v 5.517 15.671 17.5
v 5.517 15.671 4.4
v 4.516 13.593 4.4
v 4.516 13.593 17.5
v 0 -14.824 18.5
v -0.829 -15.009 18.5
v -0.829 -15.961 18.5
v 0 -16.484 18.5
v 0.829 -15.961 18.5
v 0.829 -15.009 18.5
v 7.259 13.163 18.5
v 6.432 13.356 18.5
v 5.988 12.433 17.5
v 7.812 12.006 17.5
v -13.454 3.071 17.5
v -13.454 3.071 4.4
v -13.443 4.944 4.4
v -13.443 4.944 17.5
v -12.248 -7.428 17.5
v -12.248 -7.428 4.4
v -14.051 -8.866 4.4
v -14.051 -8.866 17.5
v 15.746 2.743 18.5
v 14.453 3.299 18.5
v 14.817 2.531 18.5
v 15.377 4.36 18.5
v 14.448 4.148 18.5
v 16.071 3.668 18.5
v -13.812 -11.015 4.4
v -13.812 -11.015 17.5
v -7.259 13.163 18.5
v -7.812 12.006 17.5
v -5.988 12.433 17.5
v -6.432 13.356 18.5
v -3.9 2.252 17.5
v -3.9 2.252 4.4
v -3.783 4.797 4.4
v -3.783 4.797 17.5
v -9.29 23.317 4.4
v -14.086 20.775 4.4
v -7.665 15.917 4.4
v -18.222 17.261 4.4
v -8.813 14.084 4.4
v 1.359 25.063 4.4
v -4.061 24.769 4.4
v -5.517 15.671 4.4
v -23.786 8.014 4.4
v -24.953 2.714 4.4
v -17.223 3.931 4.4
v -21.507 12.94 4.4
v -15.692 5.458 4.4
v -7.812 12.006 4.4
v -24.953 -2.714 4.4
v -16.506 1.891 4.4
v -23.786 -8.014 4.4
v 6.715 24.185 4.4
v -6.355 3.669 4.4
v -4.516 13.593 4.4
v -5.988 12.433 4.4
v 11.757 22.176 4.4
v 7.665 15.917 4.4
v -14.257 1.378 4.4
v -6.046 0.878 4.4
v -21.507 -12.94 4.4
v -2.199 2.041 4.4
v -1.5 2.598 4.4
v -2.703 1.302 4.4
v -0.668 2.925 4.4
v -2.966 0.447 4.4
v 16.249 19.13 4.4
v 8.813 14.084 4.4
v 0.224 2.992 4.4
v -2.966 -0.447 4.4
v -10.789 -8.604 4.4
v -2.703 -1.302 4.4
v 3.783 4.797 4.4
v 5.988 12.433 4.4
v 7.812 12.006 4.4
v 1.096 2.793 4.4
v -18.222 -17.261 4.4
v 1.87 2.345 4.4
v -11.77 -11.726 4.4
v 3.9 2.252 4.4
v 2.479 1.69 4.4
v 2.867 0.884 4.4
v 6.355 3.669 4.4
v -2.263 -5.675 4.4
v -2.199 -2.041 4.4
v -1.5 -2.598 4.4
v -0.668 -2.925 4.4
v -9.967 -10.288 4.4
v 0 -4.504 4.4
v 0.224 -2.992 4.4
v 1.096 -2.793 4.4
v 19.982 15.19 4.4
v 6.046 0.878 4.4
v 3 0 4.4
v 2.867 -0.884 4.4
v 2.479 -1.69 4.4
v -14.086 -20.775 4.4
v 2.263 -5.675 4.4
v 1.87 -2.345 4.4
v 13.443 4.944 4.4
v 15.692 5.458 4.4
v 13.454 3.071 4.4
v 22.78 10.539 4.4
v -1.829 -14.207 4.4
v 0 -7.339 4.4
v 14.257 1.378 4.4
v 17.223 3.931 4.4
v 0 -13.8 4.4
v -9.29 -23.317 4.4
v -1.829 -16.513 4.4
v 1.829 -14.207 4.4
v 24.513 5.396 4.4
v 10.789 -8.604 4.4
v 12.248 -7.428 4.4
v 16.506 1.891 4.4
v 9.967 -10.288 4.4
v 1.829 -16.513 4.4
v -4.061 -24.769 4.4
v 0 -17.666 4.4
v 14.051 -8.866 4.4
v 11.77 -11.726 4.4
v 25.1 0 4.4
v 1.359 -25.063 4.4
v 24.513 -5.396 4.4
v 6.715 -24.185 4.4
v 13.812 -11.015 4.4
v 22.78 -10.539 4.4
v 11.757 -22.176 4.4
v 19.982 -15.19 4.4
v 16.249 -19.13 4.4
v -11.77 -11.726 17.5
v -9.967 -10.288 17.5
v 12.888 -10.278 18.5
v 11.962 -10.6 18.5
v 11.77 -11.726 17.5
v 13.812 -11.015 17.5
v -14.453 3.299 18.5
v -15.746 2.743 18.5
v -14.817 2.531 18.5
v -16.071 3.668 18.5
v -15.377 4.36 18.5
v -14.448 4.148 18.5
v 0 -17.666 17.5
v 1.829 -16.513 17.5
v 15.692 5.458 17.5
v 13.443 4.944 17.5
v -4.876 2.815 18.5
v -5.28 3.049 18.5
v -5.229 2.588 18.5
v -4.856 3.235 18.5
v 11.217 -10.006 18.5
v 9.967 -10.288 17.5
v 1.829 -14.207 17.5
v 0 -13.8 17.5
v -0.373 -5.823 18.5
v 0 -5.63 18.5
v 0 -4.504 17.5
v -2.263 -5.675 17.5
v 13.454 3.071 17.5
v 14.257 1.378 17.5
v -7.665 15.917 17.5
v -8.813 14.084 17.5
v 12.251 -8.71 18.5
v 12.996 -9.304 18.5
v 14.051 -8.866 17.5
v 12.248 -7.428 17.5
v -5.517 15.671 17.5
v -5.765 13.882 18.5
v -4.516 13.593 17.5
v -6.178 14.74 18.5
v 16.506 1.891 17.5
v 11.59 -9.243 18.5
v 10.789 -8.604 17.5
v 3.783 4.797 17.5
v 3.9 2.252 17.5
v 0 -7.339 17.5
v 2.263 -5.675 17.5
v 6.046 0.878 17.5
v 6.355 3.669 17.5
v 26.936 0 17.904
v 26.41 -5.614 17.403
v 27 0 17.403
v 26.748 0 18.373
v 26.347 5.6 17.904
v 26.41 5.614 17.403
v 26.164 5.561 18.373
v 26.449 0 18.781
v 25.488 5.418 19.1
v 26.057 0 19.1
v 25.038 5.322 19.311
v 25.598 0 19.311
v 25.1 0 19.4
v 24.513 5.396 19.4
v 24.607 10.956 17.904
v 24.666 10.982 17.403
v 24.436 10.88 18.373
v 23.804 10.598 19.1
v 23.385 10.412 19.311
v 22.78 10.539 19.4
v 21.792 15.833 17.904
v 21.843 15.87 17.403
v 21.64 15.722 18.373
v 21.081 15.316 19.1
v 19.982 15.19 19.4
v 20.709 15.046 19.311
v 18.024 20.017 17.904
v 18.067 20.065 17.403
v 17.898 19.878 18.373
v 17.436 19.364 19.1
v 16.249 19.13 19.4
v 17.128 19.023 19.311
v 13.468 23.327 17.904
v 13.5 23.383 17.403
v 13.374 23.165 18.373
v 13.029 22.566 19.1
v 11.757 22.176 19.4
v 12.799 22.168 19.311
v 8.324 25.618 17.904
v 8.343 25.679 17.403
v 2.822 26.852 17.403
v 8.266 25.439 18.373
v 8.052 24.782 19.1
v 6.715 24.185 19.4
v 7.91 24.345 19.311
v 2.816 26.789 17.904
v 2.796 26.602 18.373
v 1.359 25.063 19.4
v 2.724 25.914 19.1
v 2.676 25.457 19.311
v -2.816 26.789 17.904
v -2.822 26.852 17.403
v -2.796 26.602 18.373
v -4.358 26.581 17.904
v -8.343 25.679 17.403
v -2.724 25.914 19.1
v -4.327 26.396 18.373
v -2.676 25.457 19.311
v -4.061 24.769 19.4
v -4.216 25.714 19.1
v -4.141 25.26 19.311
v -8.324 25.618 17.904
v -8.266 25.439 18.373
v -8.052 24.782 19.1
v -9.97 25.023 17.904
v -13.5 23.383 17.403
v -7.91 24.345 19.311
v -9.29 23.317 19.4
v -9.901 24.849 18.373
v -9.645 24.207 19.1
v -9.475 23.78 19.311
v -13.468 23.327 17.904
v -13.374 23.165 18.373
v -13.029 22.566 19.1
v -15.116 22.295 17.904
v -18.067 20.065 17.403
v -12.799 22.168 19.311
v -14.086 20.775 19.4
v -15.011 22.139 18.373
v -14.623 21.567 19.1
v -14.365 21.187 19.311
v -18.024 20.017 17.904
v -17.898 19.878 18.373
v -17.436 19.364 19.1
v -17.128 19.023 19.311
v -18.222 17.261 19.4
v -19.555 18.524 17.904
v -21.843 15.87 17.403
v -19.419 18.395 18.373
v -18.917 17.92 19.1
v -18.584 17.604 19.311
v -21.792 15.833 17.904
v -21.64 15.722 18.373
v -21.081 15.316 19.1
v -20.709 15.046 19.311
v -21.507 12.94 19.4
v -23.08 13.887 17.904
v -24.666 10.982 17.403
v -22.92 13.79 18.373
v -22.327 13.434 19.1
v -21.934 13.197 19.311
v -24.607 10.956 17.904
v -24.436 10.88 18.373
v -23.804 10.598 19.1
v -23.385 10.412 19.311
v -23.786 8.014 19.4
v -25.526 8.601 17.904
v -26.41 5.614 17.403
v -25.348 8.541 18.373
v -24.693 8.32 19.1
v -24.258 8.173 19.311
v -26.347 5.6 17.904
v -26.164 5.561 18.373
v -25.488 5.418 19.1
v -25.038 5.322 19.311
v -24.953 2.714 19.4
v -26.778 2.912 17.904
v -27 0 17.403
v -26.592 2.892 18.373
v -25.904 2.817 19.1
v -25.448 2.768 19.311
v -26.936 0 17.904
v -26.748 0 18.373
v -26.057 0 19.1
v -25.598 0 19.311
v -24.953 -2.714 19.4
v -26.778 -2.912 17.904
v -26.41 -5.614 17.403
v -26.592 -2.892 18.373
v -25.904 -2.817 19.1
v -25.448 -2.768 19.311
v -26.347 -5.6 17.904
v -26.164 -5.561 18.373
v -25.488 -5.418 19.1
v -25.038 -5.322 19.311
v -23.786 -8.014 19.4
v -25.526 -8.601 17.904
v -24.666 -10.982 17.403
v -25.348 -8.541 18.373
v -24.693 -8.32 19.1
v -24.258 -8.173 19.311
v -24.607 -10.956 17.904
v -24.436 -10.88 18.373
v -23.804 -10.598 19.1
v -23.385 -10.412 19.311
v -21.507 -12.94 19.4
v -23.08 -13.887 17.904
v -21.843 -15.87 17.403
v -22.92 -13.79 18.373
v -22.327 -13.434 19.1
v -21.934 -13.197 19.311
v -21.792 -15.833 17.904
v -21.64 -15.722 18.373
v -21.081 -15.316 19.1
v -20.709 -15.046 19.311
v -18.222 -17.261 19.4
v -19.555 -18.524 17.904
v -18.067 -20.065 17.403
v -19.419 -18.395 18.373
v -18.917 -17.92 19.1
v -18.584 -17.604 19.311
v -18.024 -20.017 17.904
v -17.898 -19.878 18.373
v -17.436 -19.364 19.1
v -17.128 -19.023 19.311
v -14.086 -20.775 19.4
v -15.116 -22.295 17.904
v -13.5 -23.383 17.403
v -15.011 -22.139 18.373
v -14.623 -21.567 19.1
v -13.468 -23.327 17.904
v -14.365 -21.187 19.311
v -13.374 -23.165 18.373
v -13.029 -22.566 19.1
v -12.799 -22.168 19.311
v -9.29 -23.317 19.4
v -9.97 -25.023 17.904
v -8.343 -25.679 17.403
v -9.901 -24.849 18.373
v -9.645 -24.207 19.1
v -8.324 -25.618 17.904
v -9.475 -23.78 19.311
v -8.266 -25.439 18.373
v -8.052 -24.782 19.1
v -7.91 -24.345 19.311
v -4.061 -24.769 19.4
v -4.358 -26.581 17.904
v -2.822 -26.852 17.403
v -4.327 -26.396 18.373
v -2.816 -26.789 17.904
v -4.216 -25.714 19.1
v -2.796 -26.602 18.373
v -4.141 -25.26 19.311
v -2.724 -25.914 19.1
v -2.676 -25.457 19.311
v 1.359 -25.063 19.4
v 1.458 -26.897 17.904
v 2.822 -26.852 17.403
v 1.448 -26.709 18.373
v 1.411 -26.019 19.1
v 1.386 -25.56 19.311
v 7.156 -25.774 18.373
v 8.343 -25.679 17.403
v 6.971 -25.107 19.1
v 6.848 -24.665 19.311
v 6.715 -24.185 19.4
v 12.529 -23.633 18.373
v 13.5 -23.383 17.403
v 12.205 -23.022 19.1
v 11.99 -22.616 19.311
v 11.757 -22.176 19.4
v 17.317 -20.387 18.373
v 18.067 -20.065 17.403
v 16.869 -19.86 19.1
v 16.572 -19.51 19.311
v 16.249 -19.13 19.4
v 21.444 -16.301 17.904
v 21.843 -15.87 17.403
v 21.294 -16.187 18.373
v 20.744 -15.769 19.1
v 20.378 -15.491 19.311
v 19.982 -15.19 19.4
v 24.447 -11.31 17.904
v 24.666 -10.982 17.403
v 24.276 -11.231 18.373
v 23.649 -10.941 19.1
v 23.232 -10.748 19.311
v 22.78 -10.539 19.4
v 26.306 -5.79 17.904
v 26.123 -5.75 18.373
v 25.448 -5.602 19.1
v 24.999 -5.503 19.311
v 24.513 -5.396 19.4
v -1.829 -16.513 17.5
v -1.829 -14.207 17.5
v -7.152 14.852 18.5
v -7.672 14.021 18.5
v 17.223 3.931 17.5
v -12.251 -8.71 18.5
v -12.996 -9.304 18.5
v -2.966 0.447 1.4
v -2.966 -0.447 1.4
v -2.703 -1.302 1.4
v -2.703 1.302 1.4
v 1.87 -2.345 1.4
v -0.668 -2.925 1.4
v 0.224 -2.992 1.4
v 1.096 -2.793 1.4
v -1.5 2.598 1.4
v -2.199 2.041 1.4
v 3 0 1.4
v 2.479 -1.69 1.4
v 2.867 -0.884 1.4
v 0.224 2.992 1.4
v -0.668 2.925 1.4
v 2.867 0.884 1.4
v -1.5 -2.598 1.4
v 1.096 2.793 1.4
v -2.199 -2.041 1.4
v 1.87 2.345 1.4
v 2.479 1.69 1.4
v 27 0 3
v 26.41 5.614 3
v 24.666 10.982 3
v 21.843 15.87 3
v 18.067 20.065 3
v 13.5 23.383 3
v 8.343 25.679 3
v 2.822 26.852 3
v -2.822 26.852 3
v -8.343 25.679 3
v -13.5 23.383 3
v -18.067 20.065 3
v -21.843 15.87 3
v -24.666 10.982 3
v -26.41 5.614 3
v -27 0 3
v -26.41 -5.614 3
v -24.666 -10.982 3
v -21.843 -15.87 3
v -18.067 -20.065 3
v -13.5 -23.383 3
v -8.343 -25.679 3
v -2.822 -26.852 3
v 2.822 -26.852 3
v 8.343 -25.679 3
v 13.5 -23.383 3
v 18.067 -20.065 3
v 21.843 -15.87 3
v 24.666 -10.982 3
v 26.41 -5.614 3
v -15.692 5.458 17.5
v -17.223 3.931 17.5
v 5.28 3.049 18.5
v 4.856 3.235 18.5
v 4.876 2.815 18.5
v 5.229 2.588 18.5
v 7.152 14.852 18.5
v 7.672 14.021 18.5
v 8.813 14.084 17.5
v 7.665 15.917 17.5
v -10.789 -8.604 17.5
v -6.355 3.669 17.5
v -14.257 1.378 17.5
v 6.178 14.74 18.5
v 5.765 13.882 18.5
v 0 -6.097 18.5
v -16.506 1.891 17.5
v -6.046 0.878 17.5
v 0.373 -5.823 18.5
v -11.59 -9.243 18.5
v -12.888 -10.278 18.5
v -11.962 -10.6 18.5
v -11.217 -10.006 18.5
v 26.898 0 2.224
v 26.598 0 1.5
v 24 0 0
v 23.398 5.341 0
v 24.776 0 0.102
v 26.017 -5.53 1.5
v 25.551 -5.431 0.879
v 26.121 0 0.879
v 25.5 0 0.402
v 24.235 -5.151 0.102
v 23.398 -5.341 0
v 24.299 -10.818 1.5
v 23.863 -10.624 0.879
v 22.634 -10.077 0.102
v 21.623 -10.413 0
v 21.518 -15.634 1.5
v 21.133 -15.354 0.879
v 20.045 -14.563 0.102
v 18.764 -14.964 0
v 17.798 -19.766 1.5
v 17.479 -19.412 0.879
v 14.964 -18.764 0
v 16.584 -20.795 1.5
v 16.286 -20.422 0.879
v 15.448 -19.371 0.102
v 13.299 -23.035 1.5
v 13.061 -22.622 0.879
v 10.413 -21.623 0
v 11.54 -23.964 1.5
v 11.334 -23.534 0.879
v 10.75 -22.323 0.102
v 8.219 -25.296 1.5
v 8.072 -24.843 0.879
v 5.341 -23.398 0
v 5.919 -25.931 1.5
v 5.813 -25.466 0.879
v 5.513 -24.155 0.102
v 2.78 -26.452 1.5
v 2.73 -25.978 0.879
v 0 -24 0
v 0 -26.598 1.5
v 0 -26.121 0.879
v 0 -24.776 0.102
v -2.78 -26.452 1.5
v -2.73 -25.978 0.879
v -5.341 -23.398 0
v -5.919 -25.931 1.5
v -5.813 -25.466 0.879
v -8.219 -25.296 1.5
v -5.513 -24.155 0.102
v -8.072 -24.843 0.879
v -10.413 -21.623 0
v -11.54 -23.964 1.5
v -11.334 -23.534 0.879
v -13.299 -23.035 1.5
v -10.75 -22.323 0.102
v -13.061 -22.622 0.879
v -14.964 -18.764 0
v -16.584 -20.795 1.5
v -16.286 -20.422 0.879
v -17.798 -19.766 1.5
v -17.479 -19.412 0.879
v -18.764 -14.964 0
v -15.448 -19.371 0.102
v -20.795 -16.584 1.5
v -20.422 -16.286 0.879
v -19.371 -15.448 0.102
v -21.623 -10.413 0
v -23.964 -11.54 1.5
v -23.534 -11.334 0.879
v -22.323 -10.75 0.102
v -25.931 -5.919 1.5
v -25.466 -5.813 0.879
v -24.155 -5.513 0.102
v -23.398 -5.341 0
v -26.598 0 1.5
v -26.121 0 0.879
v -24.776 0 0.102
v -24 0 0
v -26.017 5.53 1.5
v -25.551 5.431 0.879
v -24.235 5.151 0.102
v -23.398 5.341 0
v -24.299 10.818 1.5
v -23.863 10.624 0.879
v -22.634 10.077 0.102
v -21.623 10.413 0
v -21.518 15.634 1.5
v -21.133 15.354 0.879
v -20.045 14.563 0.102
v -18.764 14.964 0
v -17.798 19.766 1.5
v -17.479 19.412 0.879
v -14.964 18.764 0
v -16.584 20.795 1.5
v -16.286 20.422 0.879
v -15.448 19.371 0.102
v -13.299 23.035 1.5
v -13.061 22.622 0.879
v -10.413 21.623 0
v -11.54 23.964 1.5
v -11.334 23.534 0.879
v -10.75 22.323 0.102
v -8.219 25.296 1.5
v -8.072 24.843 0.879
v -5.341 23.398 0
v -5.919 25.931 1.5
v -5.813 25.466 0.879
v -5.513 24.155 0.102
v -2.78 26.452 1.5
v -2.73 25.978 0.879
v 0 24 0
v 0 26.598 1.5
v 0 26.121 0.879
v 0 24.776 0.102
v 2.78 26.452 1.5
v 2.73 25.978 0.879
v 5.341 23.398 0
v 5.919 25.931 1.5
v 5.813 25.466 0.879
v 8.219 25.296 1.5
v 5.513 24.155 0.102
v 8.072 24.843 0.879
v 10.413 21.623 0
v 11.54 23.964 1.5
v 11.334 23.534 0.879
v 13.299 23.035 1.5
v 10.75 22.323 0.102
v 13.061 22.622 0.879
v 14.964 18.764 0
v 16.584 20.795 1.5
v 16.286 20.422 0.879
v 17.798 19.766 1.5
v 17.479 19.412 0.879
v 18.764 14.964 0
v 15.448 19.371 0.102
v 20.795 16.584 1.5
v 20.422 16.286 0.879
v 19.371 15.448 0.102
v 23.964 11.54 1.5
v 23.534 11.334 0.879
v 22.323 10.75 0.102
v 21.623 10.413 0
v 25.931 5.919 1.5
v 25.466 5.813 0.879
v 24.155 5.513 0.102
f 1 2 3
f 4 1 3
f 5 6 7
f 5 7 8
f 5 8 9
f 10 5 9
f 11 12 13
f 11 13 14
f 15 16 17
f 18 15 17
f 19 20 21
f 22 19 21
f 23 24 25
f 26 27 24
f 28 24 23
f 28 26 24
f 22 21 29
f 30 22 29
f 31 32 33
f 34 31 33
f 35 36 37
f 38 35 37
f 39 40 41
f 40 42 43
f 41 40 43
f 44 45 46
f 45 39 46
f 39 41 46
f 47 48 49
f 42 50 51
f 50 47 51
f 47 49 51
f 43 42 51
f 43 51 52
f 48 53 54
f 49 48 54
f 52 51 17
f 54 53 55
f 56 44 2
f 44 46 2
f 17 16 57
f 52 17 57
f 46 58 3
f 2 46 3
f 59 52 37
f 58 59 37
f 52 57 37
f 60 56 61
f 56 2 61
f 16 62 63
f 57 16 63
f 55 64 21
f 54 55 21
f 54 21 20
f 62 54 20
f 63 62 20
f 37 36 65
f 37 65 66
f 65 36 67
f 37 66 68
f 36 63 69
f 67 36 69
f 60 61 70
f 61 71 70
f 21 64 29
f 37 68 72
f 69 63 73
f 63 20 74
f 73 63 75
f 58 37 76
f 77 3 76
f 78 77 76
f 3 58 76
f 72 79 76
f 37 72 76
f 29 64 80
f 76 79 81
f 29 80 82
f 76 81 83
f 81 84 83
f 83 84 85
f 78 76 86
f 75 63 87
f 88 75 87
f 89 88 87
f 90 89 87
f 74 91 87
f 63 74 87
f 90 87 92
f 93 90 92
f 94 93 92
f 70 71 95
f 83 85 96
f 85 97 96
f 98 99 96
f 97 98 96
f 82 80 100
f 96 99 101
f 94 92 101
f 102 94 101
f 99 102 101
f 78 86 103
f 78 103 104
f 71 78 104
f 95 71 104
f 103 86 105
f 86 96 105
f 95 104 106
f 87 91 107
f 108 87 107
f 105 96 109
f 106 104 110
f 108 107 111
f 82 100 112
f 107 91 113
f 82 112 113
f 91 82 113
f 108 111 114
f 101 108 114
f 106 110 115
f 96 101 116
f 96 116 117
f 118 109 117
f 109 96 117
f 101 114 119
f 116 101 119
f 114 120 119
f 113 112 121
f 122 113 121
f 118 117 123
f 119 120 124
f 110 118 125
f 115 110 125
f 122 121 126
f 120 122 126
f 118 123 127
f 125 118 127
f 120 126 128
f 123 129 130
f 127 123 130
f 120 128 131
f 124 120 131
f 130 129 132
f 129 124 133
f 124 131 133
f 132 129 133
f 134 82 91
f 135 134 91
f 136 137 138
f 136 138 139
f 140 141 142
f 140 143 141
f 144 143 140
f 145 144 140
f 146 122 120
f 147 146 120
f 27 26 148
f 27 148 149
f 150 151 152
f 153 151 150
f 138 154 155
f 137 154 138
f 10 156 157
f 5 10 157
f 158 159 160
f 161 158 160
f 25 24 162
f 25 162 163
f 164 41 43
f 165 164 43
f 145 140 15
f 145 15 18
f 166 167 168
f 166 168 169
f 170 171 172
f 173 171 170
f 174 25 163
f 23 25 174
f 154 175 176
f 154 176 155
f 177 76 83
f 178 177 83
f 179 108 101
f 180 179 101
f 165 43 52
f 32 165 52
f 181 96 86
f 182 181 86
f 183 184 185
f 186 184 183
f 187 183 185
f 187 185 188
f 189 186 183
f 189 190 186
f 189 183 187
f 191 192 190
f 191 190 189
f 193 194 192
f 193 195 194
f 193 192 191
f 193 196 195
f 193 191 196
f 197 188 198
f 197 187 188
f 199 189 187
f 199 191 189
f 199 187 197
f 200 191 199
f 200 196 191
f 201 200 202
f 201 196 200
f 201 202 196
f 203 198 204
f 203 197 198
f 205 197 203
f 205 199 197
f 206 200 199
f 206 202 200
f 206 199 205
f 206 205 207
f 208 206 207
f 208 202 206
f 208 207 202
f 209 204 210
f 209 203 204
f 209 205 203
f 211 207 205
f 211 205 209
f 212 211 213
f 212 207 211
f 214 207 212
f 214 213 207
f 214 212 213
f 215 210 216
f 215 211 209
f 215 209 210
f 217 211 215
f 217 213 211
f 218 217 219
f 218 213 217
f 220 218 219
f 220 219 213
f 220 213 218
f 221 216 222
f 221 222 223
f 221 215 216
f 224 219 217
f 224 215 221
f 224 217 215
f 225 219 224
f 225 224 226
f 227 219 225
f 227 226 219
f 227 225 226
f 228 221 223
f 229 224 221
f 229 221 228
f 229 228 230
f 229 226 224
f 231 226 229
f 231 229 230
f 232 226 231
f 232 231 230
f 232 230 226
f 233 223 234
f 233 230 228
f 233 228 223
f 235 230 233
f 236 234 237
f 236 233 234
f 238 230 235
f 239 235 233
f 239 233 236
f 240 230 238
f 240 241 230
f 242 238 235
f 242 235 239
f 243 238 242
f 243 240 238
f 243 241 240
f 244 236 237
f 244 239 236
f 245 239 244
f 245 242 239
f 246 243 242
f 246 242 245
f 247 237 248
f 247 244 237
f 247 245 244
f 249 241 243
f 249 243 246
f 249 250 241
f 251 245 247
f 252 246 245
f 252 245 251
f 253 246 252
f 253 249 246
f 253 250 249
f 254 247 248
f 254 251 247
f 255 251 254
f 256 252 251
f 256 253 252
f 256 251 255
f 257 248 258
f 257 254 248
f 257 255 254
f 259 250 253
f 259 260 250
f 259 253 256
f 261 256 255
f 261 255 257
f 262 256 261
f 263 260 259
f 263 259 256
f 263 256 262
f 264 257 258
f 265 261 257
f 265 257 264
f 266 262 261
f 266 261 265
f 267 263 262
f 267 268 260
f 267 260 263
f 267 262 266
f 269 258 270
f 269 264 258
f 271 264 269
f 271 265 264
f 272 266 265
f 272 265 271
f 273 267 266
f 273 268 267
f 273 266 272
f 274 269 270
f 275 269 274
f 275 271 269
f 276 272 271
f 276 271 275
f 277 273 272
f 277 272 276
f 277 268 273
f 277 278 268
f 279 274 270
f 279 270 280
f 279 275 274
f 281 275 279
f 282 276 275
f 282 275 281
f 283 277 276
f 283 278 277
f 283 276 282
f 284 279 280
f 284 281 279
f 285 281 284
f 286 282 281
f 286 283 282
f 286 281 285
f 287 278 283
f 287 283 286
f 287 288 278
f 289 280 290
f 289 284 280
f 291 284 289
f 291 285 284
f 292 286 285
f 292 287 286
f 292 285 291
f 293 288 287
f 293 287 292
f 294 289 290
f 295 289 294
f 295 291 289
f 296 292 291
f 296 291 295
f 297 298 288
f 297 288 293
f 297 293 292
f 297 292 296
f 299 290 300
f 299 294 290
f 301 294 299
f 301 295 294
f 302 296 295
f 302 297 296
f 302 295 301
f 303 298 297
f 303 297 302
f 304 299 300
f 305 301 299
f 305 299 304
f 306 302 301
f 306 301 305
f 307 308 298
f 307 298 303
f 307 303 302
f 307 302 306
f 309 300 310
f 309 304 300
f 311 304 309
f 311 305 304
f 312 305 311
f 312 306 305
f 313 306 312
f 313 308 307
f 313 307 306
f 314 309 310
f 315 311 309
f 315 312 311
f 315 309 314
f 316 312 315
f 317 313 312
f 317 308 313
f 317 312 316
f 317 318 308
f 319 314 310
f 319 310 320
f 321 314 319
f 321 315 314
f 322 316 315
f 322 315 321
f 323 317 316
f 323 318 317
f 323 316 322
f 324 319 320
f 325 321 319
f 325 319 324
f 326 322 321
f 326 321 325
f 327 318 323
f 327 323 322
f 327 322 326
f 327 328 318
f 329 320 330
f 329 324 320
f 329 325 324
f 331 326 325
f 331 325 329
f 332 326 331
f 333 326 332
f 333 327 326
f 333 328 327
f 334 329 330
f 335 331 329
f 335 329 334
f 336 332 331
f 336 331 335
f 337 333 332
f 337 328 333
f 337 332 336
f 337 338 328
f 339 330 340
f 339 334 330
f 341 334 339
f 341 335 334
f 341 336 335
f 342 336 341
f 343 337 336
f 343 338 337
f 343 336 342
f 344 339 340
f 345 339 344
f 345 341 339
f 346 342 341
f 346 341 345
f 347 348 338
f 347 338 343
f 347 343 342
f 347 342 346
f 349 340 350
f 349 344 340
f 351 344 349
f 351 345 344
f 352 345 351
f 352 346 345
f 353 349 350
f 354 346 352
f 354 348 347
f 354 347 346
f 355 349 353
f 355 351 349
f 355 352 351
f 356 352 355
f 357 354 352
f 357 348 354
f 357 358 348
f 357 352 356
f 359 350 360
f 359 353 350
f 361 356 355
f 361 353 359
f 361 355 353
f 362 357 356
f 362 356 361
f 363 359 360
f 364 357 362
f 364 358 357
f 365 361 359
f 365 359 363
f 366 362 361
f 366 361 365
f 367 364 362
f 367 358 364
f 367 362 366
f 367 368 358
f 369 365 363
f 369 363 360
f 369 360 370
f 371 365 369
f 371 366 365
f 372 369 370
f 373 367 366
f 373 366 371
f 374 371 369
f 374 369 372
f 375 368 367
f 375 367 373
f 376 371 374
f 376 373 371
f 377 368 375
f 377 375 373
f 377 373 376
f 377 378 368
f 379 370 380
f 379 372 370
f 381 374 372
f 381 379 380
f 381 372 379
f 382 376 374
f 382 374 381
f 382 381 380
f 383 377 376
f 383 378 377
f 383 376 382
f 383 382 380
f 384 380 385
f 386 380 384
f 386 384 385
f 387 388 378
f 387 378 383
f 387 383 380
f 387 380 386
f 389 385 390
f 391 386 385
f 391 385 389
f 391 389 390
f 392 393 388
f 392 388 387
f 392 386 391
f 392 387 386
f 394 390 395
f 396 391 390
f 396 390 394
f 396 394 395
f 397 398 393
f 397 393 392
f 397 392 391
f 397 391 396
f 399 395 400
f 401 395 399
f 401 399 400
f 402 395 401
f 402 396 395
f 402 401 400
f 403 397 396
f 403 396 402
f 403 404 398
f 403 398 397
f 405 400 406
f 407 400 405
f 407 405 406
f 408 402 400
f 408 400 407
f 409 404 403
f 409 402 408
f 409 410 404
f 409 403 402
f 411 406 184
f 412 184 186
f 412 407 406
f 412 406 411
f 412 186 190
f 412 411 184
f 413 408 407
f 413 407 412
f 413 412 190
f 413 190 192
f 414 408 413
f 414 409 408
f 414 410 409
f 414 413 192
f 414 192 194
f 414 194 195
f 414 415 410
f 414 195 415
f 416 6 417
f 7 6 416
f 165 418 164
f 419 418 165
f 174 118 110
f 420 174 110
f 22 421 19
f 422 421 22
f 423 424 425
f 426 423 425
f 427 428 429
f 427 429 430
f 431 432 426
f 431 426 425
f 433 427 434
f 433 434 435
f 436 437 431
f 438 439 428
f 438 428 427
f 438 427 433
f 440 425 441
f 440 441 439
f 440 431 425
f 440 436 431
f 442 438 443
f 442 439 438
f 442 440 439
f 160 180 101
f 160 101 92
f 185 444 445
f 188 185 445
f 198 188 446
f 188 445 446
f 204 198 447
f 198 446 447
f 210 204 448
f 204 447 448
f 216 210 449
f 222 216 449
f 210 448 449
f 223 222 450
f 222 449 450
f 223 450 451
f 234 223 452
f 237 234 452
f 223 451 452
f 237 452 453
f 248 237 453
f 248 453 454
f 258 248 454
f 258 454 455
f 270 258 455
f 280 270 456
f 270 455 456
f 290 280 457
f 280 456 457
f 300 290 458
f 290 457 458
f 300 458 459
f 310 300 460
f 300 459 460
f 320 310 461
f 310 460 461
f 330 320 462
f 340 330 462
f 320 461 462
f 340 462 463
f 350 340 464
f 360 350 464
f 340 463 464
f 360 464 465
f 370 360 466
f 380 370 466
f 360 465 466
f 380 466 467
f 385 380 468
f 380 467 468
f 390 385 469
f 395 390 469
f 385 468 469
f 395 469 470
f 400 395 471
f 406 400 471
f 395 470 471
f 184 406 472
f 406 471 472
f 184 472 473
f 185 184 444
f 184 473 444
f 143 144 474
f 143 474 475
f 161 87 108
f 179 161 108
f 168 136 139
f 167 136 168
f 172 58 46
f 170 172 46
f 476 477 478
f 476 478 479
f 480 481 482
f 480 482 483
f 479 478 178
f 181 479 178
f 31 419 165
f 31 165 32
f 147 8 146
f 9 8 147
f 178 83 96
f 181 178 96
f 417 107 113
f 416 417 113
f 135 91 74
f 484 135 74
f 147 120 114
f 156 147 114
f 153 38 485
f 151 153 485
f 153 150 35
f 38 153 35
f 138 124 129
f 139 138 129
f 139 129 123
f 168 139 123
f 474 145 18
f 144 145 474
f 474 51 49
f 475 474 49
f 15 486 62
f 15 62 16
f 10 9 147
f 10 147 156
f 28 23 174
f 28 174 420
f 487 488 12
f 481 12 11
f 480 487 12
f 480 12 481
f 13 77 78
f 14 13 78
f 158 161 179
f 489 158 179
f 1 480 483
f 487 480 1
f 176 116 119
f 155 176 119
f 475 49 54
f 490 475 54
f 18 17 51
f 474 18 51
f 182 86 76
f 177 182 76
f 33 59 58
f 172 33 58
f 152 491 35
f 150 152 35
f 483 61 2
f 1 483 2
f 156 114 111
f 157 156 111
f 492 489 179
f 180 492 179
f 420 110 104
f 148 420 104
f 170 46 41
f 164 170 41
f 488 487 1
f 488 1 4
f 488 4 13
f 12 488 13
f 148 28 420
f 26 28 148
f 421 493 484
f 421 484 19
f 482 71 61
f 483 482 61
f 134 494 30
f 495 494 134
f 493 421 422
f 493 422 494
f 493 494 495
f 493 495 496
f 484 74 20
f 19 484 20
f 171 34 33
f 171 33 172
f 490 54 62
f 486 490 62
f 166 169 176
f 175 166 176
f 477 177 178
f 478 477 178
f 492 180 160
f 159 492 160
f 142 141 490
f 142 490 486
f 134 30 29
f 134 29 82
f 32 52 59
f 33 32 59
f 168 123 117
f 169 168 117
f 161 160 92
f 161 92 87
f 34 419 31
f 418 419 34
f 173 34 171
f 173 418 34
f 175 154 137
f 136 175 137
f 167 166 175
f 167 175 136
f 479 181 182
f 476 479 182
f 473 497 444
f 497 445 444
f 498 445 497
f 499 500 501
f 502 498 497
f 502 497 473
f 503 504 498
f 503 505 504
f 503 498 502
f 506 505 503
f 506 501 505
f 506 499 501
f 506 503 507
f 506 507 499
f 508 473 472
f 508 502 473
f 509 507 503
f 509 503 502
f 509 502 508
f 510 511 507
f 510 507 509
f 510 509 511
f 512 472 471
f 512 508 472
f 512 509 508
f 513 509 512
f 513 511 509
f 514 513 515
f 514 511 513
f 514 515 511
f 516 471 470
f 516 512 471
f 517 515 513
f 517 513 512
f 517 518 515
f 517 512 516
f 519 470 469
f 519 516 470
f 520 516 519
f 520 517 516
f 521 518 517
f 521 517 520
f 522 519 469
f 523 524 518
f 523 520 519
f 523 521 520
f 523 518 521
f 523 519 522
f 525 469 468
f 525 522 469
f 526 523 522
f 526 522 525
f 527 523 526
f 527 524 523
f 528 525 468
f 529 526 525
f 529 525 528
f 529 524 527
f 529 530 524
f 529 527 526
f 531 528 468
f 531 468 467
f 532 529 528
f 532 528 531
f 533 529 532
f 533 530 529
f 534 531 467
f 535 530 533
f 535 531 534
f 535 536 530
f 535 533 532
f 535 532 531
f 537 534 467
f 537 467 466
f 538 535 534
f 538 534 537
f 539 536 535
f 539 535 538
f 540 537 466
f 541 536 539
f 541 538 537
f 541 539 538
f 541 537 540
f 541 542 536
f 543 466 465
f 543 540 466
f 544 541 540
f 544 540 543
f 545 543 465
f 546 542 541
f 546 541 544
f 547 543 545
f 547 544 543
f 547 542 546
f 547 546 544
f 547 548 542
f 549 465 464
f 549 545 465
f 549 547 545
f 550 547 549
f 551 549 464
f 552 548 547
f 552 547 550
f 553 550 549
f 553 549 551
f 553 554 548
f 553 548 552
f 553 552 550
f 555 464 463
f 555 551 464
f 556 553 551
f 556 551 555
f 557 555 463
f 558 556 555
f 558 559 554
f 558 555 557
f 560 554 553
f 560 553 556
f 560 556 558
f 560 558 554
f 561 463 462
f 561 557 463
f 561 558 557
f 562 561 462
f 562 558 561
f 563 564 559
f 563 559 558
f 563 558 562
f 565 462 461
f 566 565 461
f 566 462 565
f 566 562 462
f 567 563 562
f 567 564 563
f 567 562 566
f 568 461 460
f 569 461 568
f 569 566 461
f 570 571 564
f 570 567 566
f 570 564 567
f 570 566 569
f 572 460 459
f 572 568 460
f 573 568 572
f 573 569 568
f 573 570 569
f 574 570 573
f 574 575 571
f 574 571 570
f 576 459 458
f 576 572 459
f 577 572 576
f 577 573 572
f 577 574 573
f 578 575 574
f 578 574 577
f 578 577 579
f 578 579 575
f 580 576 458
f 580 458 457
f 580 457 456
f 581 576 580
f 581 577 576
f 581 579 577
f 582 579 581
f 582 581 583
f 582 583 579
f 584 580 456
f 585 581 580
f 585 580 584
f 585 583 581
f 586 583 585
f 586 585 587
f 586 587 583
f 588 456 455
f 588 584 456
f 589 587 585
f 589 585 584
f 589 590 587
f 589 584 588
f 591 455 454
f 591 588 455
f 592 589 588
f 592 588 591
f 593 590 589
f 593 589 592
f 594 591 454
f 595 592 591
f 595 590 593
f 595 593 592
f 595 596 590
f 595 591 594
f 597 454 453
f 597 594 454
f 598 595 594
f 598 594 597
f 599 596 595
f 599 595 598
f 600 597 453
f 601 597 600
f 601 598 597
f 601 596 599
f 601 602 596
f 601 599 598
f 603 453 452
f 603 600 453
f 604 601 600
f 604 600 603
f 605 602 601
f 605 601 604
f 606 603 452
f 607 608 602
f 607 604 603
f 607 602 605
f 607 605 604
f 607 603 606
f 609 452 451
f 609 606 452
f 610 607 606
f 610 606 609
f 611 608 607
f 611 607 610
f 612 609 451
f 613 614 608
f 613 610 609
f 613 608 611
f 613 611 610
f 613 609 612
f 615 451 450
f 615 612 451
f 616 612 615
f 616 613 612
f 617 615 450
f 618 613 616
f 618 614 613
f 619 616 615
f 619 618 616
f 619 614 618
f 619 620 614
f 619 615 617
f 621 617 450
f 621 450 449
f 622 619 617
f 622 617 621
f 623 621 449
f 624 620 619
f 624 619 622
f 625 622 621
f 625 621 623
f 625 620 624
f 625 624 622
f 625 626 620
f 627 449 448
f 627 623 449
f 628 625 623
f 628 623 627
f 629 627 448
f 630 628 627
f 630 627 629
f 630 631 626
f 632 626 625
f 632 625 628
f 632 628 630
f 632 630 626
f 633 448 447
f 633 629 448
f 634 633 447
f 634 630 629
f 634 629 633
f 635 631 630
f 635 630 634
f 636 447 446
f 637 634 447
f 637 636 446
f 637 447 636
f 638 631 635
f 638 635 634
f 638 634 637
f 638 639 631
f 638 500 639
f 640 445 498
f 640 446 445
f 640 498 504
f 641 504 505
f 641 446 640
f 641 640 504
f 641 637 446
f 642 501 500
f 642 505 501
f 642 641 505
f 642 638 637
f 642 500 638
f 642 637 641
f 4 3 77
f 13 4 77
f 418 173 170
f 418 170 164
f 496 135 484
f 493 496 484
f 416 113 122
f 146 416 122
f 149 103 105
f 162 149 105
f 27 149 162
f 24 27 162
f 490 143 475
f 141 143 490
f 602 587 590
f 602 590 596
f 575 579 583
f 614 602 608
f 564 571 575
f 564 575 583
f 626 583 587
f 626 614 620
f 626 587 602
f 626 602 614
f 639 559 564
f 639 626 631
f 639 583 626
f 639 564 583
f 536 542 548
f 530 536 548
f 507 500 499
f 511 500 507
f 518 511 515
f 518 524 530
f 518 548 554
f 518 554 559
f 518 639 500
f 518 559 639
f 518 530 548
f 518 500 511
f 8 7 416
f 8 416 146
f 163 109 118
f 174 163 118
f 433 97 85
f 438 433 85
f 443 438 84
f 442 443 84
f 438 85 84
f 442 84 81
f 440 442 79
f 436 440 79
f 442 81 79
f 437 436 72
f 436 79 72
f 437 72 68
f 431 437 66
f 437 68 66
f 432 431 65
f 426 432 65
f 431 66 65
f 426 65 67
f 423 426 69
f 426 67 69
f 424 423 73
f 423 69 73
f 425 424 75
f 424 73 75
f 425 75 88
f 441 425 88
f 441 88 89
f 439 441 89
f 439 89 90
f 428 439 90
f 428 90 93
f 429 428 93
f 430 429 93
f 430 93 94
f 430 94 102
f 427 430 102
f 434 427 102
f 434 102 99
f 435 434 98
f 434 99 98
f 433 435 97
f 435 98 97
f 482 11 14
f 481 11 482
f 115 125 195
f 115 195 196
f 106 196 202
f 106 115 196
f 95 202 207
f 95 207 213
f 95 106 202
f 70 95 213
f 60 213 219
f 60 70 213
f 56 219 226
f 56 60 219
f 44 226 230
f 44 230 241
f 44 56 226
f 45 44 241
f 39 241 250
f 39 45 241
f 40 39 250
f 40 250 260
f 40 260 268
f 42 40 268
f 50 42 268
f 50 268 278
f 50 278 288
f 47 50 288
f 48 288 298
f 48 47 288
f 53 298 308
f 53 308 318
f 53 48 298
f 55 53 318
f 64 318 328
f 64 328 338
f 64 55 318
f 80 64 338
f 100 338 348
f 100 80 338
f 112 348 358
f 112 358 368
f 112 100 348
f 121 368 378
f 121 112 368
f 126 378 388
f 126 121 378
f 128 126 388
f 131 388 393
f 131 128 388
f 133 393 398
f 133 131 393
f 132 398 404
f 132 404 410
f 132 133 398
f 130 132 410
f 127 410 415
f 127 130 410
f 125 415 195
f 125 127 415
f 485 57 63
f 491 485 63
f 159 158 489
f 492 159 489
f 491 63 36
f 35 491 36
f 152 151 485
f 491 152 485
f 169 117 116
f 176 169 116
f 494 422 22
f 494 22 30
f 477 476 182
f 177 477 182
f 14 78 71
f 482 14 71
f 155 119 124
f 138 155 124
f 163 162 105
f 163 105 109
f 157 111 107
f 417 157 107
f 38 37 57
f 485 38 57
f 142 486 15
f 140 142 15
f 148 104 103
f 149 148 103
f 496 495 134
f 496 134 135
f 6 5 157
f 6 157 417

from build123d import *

# Parameters (mm, degrees)
F0_R      = 25
F1_DEPTH  = 4
F3_R      = 27
F4_DEPTH  = 4.4
F5_DEPTH  = 14.5
F6_R      = 27
F6_R_2    = 25.1
F7_DEPTH  = 15
F9_R      = 3
F10_SIZE  = 1
F11_R     = 3
F12_DEPTH = 3


# Not quite as in the source:
# - a fillet or chamfer that OpenCascade refuses, or shapes differently, is made with other operations: its cross-section is extruded or revolved along the edge and cut away or added
# - a feature names something its author has since deleted; it is built from what else it names


with BuildPart() as f1:
    # F0 (on Top) → F1 (new body)
    with BuildSketch(Plane.XY):
        Circle(F0_R)
    extrude(amount=F1_DEPTH)

    # F3 (on face) → F4 (join)
    with BuildSketch(Plane(origin=(0, 0, 0), x_dir=(1, 0, 0), z_dir=(0, 0, -1))):
        Circle(F3_R)
    extrude(amount=-F4_DEPTH)

    # F2 (on face) → F5 (join)
    with BuildSketch(Plane.XY.offset(4)):
        Polygon((1.8290777225, -14.20661062), (0, -13.8), (-1.8290777225, -14.20661062), (-1.8290777225, -16.5130756795), (0, -17.6663082093), (1.8290777225, -16.5130756795), align=None)
        Polygon((10.7892744581, -8.6041592657), (9.9667641351, -10.2877073879), (11.7700311319, -11.7257648309), (13.812075937, -11.014763005), (14.0508537454, -8.8657037362), (12.2475867487, -7.4276462932), align=None)
        Polygon((13.4540051881, 3.0707888886), (14.257429314, 1.3780493383), (16.506066479, 1.8912860975), (17.2233769785, 3.9311234023), (15.6920503129, 5.4577239479), (13.4434131479, 4.9444871887), align=None)
        Polygon((5.9875955998, 12.4333703771), (7.811959421, 12.0061068057), (8.8126971051, 14.0841600192), (7.6651238623, 15.9167937073), (5.5168129352, 15.671374182), (4.5160752511, 13.5933209684), align=None)
        Polygon((-5.9875955998, 12.4333703771), (-4.5160752511, 13.5933209684), (-5.5168129352, 15.671374182), (-7.6651238623, 15.9167937073), (-8.8126971051, 14.0841600192), (-7.811959421, 12.0061068057), align=None)
        Polygon((-13.4540051881, 3.0707888886), (-13.4434131479, 4.9444871887), (-15.6920503129, 5.4577239479), (-17.2233769785, 3.9311234023), (-16.506066479, 1.8912860975), (-14.257429314, 1.3780493383), align=None)
        Polygon((-10.7892744581, -8.6041592657), (-12.2475867487, -7.4276462932), (-14.0508537454, -8.8657037362), (-13.812075937, -11.014763005), (-11.7700311319, -11.7257648309), (-9.9667641351, -10.2877073879), align=None)
        Polygon((2.2625249746, -5.6745974369), (0, -4.5038154349), (-2.2625249746, -5.6745974369), (0, -7.3385047726), align=None)
        Polygon((3.7830830493, 4.7967028232), (3.9004185806, 2.2519077174), (6.0456080239, 0.8778946137), (6.3553315589, 3.6692523863), align=None)
        Polygon((-6.0456080239, 0.8778946137), (-3.9004185806, 2.2519077174), (-3.7830830493, 4.7967028232), (-6.3553315589, 3.6692523863), align=None)
    extrude(amount=F5_DEPTH)

    # F6 (on face) → F7 (join)
    with BuildSketch(Plane.XY.offset(4.4)):
        Circle(F6_R)
        Circle(F6_R_2, mode=Mode.SUBTRACT)
    extrude(amount=F7_DEPTH)

    # F8: fillet of radius 2 on 1 edges, made by hand

    # F8_s1 → F8_t2 (revolve, cut)
    with BuildSketch(Plane.XZ):
        with BuildLine():
            ThreePointArc((27, 17.4025015645), (26.4491376746, 18.7809064397), (25.1, 19.4))
            Line((25.1, 19.4), (27, 19.4))
            Line((27, 19.4), (27, 17.4025015645))
        make_face()
    revolve(axis=Axis((0, 0, 19.4), (0, 0, 1)), mode=Mode.SUBTRACT)

    # F9
    f9_edges = [f1.edges().sort_by_distance(p)[0] for p in [
        (-27, 0, 0),
    ]]
    fillet(f9_edges, radius=F9_R)

    # F10
    f10_edges = [f1.edges().sort_by_distance(p)[0] for p in [
        (1.131262, -5.089206, 18.5),
        (-1.131262, -5.089206, 18.5),
        (-1.131262, -6.506551, 18.5),
        (1.131262, -6.506551, 18.5),
        (6.20047, 2.273574, 18.5),
        (5.069207, 4.232978, 18.5),
        (3.841751, 3.524305, 18.5),
        (4.973013, 1.564901, 18.5),
        (5.016444, 14.632348, 18.5),
        (5.251835, 13.013346, 18.5),
        (6.899778, 12.219739, 18.5),
        (8.312328, 13.045133, 18.5),
        (8.23891, 15.000477, 18.5),
        (6.590968, 15.794084, 18.5),
        (-5.069207, 4.232978, 18.5),
        (-6.20047, 2.273574, 18.5),
        (-4.973013, 1.564901, 18.5),
        (-3.841751, 3.524305, 18.5),
        (-5.251835, 13.013346, 18.5),
        (-5.016444, 14.632348, 18.5),
        (-6.590968, 15.794084, 18.5),
        (-8.23891, 15.000477, 18.5),
        (-8.312328, 13.045133, 18.5),
        (-6.899778, 12.219739, 18.5),
        (13.855717, 2.224419, 18.5),
        (15.381748, 1.634668, 18.5),
        (16.864722, 2.911205, 18.5),
        (16.457714, 4.694424, 18.5),
        (14.567732, 5.201106, 18.5),
        (13.448709, 4.007638, 18.5),
        (10.378019, -9.445933, 18.5),
        (10.868398, -11.006736, 18.5),
        (12.791054, -11.370264, 18.5),
        (13.931465, -9.940233, 18.5),
        (13.14922, -8.146675, 18.5),
        (11.518431, -8.015903, 18.5),
        (0.914539, -14.003305, 18.5),
        (-0.914539, -14.003305, 18.5),
        (-1.829078, -15.359843, 18.5),
        (-0.914539, -17.089692, 18.5),
        (0.914539, -17.089692, 18.5),
        (1.829078, -15.359843, 18.5),
        (-11.518431, -8.015903, 18.5),
        (-13.14922, -8.146675, 18.5),
        (-13.931465, -9.940233, 18.5),
        (-12.791054, -11.370264, 18.5),
        (-10.868398, -11.006736, 18.5),
        (-10.378019, -9.445933, 18.5),
        (-15.381748, 1.634668, 18.5),
        (-13.855717, 2.224419, 18.5),
        (-13.448709, 4.007638, 18.5),
        (-14.567732, 5.201106, 18.5),
        (-16.457714, 4.694424, 18.5),
        (-16.864722, 2.911205, 18.5),
    ]]
    chamfer(f10_edges, length=F10_SIZE)

    # F11 (on face) → F12 (cut)
    with BuildSketch(Plane.XY.offset(4.4)):
        Circle(F11_R)
    extrude(amount=-F12_DEPTH, mode=Mode.SUBTRACT)


solid = f1.part
